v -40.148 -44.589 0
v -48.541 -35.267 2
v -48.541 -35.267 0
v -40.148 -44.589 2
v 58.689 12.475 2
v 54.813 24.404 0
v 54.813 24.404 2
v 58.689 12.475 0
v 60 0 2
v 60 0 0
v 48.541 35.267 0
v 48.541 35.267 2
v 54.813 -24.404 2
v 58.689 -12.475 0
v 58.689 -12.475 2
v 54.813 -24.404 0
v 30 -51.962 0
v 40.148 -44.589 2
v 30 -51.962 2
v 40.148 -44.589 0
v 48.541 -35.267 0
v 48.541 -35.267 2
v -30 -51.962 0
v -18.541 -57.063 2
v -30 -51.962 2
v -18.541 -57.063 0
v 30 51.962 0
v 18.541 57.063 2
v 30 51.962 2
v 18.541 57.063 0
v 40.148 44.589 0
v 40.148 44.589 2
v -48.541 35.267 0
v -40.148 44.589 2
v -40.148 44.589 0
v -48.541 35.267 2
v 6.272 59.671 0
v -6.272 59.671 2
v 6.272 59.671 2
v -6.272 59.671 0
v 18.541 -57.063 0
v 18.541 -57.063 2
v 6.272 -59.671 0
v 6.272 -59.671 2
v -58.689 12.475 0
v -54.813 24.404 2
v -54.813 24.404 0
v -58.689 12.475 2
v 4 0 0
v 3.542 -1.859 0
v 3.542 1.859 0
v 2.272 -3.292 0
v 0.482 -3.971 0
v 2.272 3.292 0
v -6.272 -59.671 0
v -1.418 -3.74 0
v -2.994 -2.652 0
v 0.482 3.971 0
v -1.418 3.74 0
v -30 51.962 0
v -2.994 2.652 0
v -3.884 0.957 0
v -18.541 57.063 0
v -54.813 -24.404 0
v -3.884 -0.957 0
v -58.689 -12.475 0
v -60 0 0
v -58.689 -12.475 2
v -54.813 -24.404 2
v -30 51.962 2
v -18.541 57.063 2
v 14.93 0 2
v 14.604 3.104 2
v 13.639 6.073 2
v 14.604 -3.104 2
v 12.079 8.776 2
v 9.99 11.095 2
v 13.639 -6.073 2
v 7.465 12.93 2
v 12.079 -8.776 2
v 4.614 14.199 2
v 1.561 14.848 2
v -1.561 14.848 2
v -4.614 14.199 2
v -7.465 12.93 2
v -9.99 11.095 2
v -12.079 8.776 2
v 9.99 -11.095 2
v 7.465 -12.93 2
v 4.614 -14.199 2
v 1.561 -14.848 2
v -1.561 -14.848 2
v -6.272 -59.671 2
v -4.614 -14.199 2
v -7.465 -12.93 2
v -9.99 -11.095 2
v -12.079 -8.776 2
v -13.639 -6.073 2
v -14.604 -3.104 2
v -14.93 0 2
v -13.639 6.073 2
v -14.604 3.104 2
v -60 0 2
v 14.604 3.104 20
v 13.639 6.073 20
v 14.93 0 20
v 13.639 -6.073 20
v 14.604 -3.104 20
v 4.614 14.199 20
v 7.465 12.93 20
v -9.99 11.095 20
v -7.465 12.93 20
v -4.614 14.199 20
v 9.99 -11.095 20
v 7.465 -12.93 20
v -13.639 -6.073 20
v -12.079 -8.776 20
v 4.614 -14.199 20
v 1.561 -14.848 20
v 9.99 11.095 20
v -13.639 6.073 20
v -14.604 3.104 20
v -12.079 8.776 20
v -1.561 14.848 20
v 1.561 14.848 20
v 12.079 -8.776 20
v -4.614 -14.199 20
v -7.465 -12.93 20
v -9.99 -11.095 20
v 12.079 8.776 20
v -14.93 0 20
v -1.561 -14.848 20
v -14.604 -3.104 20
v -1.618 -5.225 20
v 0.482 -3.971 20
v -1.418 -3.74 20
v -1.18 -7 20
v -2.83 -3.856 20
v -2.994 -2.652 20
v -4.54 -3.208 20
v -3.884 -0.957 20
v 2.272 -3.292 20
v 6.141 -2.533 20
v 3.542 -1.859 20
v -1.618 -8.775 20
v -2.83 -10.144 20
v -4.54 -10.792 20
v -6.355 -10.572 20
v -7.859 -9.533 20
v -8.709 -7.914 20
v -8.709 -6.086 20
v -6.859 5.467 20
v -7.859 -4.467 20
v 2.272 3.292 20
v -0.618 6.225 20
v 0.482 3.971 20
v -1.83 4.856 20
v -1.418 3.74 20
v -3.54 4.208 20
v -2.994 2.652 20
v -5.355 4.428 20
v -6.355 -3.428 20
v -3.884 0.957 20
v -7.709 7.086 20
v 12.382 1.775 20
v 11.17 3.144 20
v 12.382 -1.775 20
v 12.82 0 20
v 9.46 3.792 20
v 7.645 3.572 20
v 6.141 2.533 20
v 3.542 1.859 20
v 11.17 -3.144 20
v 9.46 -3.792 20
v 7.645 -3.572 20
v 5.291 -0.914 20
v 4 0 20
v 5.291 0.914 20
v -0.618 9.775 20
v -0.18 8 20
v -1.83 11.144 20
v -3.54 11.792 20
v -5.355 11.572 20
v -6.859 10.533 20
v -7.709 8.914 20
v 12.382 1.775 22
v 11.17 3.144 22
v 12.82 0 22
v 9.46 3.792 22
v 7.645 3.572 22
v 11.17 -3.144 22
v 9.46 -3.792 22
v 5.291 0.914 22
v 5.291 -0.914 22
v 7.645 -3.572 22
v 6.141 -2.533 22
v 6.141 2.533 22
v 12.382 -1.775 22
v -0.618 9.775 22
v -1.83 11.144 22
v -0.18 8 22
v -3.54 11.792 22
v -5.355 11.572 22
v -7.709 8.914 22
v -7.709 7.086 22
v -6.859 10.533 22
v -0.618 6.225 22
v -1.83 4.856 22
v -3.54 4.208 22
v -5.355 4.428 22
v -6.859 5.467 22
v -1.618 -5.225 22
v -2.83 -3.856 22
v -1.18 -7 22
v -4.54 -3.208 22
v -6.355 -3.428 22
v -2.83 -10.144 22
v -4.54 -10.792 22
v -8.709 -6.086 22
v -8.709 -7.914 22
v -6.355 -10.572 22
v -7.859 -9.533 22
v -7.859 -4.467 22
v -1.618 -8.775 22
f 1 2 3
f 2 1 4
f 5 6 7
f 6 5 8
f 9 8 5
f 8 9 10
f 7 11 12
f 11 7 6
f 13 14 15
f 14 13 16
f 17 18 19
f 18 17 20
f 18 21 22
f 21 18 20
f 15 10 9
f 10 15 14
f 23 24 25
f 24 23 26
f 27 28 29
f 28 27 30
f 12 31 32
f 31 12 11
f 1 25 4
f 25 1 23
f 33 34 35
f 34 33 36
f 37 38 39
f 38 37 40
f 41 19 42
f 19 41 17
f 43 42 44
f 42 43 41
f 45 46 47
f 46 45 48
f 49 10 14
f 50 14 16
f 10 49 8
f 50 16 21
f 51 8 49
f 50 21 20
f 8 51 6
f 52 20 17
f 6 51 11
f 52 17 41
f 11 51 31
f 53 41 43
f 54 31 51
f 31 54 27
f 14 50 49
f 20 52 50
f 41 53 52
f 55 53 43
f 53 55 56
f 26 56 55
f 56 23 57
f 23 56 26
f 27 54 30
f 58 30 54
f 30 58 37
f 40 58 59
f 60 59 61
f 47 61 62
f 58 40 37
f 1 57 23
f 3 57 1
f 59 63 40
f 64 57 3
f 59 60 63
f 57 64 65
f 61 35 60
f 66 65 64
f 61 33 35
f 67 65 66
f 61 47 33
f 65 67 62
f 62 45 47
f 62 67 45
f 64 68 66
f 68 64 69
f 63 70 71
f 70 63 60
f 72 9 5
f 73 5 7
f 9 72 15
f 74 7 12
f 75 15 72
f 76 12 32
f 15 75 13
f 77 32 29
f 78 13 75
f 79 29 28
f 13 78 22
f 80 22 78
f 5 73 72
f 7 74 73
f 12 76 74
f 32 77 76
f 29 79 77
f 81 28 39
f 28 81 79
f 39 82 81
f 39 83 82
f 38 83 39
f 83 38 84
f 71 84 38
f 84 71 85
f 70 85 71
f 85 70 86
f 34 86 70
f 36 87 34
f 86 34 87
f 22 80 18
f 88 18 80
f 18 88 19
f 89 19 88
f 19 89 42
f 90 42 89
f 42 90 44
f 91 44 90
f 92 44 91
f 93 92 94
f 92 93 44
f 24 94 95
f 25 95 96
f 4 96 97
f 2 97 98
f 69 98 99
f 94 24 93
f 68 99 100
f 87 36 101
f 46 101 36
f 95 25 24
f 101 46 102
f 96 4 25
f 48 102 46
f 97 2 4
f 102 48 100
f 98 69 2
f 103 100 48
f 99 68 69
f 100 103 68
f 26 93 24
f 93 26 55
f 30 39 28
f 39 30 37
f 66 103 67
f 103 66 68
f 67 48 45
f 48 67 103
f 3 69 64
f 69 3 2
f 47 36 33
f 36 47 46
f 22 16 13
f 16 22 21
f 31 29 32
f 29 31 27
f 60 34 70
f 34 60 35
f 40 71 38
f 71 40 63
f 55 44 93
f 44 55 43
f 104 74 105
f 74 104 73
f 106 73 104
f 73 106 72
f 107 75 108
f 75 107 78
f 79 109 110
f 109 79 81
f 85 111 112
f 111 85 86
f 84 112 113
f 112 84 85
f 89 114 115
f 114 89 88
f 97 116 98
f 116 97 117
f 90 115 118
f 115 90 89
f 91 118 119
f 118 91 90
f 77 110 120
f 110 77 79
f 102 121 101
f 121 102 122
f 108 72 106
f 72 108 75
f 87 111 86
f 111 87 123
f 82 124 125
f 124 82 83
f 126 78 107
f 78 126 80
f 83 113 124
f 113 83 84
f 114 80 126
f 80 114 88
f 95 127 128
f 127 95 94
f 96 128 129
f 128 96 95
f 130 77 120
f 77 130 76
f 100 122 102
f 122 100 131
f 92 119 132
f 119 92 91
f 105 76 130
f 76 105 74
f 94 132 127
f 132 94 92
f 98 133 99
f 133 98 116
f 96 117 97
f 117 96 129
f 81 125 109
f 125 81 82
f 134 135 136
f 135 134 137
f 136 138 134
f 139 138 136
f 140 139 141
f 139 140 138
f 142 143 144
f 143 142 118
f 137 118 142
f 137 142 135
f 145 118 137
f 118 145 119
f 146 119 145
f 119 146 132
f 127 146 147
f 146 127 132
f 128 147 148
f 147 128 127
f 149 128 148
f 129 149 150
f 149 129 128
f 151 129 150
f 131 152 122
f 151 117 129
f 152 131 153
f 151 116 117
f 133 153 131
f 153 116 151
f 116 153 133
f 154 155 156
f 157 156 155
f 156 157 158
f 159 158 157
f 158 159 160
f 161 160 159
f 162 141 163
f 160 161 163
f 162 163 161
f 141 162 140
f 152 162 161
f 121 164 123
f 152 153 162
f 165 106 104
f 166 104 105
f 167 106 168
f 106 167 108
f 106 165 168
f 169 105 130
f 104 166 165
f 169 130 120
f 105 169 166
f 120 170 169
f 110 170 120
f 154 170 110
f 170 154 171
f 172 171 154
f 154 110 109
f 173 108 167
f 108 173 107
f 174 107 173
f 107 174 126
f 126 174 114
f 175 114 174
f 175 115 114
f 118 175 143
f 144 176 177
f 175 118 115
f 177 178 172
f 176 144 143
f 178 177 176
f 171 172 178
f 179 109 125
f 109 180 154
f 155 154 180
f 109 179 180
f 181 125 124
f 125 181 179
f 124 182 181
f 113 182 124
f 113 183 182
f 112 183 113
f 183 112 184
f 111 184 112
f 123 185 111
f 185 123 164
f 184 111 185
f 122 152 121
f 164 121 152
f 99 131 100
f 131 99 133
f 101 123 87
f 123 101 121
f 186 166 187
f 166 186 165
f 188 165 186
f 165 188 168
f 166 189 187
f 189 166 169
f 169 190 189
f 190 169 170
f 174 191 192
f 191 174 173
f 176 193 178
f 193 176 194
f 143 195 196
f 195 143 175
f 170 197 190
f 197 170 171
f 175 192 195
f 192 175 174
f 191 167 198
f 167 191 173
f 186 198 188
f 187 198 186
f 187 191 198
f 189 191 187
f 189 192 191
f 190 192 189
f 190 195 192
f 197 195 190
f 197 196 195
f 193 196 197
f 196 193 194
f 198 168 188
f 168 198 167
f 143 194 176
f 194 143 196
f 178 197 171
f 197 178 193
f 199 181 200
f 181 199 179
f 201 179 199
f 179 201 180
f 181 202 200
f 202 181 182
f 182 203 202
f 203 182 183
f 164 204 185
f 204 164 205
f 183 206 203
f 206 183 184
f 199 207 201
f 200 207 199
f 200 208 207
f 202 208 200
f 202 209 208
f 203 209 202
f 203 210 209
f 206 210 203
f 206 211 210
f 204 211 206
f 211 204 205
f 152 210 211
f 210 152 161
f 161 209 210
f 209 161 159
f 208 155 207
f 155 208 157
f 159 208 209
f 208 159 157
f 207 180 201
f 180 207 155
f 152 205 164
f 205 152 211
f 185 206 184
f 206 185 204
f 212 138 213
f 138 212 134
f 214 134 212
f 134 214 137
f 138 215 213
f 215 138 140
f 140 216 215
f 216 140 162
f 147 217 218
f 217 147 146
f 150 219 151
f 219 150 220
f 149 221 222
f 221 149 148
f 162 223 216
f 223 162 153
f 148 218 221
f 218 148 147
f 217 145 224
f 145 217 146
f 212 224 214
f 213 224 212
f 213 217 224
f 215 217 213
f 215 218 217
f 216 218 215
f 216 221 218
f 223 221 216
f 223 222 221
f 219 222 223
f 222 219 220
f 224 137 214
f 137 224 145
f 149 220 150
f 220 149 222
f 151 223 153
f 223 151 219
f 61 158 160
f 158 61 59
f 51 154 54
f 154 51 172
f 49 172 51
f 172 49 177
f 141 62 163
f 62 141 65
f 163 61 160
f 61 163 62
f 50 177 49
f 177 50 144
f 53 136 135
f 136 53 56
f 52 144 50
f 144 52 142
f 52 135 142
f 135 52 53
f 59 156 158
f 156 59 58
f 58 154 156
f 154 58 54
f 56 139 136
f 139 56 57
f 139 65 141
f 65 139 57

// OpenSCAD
// 3/4" U-Matic tape cleaner spindle
// Erik Piil
//piil.erik@gmail.com
//https://github.com/epiil/tape-cleaner
//v20150208


//SPINDLE "OUTER" PARAMETERS
outerRadius=60; //outer "seat" radius

outerDiam=120; //outer "seat" diameter

outerHeight=2; //outer "seat" height


//SPINDLE "INNER" DIAMETERS
innerRadius=13.5; //inner spindle radius

innerDiam=27; //inner spindle diameter

innerHeight=20; //inner spindle height

shaftDiam=8; //inner shaft diameter

shaftRadius=4; //inner shaft radius

//TEETH PARAMETERS

prongNum=3; //number of prongs (int)

module spindle()
{
	difference()
	{
		union()
		{
			cylinder(r=outerRadius, h=outerHeight, $fs=.01);
			cylinder(d=29.86, h=innerHeight, $fs=.01);
			translate([9,0,0])
			cylinder(h=22, r=3.82);
			translate([-4,8,0])
			cylinder(h=22, r=3.82);
			translate([-5,-7,0])
			cylinder(h=22, r=3.82)
			{

			}
		}
		
		difference()
		{
			cylinder(r=shaftRadius, h=innerHeight+1);
			{

			}
		}
	}
}



spindle();
